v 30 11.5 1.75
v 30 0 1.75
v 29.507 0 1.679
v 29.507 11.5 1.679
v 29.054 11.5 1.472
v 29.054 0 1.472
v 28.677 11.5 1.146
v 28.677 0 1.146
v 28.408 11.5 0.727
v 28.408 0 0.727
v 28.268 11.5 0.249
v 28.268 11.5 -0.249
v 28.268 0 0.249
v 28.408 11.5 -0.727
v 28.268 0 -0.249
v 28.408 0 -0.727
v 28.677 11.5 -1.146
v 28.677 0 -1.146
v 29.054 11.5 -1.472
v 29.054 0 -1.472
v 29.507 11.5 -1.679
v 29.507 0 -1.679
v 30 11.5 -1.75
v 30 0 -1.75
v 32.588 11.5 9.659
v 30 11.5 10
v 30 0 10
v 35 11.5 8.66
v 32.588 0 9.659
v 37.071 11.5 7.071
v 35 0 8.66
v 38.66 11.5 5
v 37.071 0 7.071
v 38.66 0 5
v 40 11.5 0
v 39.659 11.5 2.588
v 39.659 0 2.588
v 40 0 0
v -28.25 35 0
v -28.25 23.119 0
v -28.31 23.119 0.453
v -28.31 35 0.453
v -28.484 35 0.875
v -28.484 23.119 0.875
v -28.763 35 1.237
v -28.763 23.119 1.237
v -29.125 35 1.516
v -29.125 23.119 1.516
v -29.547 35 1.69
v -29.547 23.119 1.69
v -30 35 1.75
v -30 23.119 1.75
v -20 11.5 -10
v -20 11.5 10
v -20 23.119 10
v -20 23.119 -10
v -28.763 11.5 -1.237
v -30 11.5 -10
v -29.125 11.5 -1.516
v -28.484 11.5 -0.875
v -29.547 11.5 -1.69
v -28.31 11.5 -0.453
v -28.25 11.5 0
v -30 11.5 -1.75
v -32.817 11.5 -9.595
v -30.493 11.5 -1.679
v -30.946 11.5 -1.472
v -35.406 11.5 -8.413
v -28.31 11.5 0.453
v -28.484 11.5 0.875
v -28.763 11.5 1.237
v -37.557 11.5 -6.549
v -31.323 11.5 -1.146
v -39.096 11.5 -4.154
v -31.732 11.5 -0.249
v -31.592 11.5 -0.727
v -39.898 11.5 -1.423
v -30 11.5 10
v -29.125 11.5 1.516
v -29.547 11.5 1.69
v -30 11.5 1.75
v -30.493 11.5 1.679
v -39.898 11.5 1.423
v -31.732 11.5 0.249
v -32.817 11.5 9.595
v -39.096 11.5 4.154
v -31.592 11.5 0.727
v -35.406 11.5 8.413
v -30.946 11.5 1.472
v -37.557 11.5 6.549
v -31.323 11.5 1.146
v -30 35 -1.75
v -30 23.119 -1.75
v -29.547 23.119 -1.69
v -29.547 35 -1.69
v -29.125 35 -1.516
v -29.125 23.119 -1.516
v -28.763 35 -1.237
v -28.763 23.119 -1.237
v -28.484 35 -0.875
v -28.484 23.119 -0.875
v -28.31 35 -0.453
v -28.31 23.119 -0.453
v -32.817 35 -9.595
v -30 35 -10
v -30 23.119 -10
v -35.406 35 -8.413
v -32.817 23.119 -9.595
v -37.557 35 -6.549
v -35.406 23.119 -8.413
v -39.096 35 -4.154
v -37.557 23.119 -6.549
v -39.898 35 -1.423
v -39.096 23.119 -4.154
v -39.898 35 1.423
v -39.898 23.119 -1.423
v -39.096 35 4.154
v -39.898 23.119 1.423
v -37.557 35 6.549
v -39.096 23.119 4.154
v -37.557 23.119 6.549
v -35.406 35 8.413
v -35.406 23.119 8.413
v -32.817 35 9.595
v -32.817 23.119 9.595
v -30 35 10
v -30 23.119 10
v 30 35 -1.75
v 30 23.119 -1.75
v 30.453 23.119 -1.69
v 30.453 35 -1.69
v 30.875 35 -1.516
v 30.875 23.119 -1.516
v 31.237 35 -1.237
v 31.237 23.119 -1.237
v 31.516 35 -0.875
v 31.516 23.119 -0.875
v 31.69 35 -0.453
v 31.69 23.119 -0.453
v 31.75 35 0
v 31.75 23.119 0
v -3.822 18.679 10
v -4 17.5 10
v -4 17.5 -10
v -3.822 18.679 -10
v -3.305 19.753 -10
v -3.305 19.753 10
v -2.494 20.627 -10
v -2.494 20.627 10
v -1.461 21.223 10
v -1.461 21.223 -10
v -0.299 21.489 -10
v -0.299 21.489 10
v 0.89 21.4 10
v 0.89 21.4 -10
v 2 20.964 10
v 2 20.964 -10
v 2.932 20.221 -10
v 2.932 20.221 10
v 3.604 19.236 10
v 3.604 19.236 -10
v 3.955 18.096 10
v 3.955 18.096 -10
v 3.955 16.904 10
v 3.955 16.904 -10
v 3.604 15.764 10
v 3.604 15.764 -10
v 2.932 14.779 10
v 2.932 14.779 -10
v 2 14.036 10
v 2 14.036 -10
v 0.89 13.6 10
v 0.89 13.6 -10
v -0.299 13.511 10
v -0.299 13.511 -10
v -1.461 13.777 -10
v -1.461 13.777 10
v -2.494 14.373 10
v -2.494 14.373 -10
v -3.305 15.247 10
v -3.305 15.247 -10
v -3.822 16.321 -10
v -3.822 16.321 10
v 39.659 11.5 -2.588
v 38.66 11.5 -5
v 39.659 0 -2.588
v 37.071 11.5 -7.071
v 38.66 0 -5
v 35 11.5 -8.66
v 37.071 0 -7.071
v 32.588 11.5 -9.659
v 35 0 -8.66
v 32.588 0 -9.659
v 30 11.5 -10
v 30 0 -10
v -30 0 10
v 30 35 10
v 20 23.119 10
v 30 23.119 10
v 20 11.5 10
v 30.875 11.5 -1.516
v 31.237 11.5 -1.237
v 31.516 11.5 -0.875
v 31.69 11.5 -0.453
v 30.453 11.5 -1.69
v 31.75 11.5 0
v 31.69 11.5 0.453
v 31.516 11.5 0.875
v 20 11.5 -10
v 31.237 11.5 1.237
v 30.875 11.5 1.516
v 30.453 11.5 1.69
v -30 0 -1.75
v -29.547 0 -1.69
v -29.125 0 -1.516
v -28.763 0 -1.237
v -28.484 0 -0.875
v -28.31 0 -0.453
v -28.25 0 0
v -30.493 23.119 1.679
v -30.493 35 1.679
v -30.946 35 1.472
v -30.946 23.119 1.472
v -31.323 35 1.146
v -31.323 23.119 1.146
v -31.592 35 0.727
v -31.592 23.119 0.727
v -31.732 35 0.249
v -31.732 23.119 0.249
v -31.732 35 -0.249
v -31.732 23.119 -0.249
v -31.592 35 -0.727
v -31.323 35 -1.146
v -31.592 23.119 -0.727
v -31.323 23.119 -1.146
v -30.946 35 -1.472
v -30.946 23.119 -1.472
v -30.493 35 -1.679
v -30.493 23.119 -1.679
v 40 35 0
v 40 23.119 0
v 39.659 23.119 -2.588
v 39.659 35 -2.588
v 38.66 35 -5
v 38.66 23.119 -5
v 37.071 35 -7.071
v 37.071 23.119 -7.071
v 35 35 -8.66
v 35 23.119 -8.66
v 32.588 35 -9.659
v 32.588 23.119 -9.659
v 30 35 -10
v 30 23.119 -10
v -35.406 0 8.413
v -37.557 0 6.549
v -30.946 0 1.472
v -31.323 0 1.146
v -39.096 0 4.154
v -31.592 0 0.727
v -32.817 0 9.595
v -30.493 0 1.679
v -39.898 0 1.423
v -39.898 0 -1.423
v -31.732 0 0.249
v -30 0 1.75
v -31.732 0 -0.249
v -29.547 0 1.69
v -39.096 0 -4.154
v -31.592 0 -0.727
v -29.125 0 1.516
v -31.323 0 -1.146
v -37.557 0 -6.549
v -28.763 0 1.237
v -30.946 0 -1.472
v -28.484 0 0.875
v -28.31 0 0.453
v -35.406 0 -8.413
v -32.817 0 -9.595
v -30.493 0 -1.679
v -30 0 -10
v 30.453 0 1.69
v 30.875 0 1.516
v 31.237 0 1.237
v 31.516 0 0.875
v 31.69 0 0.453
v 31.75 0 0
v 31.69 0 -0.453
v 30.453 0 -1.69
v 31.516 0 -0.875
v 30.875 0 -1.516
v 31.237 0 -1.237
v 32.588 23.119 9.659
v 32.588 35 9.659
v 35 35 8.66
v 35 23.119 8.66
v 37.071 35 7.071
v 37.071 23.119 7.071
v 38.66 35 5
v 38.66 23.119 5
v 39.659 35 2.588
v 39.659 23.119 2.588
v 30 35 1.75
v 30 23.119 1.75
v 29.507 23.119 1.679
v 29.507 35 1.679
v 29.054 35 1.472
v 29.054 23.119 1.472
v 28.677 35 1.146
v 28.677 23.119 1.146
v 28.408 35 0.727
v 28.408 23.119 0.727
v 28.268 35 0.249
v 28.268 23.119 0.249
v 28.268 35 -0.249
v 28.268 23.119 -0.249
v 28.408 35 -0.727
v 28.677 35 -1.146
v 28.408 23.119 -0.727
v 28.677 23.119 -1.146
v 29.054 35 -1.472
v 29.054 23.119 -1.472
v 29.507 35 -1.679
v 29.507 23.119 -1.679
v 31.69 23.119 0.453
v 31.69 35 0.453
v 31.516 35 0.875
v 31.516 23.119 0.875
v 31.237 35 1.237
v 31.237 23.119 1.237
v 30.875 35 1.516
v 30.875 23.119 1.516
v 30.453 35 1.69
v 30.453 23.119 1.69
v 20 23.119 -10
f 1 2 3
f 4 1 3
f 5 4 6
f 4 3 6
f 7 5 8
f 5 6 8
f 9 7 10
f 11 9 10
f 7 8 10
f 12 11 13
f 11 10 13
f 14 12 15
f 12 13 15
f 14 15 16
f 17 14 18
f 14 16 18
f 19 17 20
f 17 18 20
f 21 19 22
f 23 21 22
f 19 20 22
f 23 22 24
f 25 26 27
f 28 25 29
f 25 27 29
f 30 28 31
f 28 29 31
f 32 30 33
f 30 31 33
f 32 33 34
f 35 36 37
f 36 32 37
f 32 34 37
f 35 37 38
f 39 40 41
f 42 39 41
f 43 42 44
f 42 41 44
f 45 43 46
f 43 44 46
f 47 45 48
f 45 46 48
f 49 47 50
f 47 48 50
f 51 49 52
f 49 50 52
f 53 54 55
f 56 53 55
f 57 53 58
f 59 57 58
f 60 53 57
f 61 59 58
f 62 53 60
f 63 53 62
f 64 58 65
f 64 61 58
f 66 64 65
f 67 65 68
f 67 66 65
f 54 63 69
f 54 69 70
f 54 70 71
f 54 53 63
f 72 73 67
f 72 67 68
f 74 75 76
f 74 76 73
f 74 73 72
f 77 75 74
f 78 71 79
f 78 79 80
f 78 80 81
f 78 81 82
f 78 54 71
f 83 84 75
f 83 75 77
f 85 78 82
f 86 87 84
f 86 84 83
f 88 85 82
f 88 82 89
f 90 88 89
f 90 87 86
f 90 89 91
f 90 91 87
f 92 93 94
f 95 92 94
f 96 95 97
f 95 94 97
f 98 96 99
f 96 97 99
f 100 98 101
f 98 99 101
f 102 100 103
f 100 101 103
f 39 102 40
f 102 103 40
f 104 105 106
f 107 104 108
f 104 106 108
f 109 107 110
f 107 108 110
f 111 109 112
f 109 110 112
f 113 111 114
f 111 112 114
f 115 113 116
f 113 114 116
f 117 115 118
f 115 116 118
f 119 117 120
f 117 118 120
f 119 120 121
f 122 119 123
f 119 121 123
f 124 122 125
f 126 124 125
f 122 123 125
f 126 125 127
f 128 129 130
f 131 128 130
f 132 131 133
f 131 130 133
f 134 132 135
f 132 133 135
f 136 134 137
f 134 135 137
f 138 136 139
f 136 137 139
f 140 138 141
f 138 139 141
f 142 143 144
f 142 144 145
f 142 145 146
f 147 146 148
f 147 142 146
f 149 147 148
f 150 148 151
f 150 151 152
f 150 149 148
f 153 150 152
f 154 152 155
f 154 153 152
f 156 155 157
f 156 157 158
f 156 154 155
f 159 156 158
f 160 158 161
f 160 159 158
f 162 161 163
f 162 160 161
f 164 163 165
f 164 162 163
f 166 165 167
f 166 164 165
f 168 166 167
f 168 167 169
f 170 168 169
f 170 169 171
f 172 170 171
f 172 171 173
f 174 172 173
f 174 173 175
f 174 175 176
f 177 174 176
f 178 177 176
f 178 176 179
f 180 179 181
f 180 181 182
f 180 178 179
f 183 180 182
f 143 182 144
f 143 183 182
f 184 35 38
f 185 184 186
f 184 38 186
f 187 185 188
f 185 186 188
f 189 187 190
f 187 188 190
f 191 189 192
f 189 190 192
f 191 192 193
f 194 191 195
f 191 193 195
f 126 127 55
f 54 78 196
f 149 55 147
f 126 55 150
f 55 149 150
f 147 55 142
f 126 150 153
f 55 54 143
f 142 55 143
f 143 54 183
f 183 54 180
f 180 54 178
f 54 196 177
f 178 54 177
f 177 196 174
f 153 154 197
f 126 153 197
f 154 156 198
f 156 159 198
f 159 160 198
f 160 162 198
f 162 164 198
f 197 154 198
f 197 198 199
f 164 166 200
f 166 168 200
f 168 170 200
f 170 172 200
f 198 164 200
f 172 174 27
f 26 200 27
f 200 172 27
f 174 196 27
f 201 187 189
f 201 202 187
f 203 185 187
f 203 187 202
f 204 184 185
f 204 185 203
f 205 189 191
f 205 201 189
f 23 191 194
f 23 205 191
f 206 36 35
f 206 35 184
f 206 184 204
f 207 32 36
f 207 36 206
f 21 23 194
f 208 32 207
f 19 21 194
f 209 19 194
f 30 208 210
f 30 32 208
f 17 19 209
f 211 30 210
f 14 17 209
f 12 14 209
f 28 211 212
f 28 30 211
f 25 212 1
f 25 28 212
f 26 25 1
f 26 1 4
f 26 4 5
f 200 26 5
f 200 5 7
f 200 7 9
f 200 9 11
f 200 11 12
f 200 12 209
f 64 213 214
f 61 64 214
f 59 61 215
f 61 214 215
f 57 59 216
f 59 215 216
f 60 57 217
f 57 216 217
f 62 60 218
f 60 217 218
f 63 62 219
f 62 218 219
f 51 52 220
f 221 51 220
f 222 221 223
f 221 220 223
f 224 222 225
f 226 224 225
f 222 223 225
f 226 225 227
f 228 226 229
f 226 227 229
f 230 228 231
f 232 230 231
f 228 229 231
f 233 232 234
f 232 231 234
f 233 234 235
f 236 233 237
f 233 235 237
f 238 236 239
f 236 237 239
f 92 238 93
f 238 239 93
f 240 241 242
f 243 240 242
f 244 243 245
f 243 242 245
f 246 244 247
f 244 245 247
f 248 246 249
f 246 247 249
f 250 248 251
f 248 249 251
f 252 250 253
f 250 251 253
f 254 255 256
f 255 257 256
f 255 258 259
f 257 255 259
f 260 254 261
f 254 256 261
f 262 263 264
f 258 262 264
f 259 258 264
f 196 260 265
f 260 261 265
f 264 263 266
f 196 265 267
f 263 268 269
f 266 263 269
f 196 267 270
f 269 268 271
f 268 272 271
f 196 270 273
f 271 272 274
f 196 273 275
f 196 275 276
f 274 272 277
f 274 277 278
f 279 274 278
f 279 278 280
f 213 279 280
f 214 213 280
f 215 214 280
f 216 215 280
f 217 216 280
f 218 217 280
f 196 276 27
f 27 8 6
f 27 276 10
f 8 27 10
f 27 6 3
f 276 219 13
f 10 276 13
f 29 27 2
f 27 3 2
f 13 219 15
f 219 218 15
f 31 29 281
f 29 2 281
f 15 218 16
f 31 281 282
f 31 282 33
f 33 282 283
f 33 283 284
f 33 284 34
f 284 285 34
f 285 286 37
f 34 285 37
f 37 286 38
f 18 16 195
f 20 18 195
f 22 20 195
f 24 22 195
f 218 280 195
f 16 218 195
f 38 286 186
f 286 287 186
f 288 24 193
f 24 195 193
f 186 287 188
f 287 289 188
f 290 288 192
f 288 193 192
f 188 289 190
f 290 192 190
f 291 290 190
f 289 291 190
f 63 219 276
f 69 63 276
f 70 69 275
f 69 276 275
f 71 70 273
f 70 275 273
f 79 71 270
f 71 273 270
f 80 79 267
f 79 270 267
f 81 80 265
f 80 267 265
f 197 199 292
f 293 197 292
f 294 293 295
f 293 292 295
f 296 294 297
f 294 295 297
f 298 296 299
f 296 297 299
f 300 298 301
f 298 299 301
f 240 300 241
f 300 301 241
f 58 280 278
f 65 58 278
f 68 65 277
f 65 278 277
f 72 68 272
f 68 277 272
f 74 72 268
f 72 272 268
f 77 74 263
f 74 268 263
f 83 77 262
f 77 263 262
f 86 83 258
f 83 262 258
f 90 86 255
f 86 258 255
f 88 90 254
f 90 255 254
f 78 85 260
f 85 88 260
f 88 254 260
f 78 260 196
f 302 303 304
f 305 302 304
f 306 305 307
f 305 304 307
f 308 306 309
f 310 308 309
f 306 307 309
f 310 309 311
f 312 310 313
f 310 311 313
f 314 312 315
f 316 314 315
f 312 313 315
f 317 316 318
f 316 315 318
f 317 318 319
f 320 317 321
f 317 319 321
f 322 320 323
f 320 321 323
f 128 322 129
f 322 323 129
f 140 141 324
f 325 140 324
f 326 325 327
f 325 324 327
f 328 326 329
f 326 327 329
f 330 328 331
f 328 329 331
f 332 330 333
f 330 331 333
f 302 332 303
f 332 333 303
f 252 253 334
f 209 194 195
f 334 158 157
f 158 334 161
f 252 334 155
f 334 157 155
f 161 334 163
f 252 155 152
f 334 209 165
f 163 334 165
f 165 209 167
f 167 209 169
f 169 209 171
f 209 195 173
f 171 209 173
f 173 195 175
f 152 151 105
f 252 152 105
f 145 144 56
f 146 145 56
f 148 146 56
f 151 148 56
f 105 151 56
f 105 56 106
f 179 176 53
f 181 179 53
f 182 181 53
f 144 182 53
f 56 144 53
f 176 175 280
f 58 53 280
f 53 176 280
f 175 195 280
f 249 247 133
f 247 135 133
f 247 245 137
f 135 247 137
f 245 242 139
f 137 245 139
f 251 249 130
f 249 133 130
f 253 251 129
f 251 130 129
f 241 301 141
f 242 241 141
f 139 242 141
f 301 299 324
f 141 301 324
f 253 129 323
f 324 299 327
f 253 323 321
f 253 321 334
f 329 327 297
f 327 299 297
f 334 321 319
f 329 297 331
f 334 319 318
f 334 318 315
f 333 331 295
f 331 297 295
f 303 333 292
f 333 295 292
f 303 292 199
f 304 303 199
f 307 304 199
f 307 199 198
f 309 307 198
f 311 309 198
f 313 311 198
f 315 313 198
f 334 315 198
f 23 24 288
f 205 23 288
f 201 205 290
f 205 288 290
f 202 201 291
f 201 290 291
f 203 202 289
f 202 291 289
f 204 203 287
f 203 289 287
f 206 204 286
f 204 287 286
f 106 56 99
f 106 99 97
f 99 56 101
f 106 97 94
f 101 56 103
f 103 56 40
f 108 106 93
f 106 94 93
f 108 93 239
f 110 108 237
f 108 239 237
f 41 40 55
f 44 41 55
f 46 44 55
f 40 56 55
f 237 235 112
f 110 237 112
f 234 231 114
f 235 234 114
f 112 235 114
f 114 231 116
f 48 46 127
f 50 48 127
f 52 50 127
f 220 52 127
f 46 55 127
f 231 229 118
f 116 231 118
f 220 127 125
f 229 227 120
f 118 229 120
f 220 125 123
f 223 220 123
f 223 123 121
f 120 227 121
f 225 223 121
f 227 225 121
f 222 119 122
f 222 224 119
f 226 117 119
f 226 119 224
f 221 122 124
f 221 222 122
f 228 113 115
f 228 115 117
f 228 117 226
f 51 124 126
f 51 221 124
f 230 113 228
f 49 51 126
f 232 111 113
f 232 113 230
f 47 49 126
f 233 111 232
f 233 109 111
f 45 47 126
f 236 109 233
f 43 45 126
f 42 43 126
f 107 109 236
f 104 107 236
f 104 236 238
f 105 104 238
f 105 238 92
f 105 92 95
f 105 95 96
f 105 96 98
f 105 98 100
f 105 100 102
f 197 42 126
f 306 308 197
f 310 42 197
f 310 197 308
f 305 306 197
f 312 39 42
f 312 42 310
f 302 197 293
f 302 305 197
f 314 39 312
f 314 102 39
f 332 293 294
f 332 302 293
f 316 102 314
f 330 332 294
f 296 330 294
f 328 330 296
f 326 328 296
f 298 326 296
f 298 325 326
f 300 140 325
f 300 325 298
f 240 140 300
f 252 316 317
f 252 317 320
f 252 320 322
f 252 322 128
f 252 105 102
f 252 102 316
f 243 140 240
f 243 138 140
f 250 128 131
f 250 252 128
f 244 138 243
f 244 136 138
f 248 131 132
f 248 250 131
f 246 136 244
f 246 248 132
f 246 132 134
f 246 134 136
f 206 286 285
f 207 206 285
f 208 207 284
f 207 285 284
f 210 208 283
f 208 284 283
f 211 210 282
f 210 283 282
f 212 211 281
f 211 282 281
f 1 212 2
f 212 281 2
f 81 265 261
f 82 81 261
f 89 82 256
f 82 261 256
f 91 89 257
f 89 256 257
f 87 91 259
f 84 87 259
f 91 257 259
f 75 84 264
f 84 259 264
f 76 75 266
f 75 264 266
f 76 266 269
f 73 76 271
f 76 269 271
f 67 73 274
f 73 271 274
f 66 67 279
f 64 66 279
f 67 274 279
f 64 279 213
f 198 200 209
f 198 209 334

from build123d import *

# Parameters (mm, degrees)
SKETCH1_R           = 1.75
BOSS_EXTRUDE1_DEPTH = 35
SKETCH3_W           = 24.518111011
SKETCH3_H           = 11.618606297
SKETCH3_R           = 4
CUT_EXTRUDE1_DEPTH  = 20


with BuildPart() as part:
    # Sketch1 → Boss-Extrude1 (new body)
    with BuildSketch(Plane(origin=(0, 0, 0), x_dir=(1, 0, 0), z_dir=(0, 1, 0))):
        with BuildLine():
            Line((30, 10), (-30, 10))
            ThreePointArc((-30, 10), (-40, 0), (-30, -10))
            Line((-30, -10), (30, -10))
            ThreePointArc((30, -10), (40, 0), (30, 10))
        make_face()
        with Locations((-30, 0)):
            Circle(SKETCH1_R, mode=Mode.SUBTRACT)
        with Locations((30, 0)):
            Circle(SKETCH1_R, mode=Mode.SUBTRACT)
    extrude(amount=BOSS_EXTRUDE1_DEPTH)

    # Sketch3 → Cut-Extrude1 (cut)
    with BuildSketch(Plane(origin=(0, 0, -10), x_dir=(-1, 0, 0), z_dir=(0, 0, -1))):
        with Locations((32.259055506, 17.309303148)):
            Rectangle(SKETCH3_W, SKETCH3_H)
        with Locations((-32.259055506, 17.309303148)):
            Rectangle(SKETCH3_W, SKETCH3_H)
        with Locations((0, 17.5)):
            Circle(SKETCH3_R)
    extrude(amount=-CUT_EXTRUDE1_DEPTH, mode=Mode.SUBTRACT)


solid = part.part
